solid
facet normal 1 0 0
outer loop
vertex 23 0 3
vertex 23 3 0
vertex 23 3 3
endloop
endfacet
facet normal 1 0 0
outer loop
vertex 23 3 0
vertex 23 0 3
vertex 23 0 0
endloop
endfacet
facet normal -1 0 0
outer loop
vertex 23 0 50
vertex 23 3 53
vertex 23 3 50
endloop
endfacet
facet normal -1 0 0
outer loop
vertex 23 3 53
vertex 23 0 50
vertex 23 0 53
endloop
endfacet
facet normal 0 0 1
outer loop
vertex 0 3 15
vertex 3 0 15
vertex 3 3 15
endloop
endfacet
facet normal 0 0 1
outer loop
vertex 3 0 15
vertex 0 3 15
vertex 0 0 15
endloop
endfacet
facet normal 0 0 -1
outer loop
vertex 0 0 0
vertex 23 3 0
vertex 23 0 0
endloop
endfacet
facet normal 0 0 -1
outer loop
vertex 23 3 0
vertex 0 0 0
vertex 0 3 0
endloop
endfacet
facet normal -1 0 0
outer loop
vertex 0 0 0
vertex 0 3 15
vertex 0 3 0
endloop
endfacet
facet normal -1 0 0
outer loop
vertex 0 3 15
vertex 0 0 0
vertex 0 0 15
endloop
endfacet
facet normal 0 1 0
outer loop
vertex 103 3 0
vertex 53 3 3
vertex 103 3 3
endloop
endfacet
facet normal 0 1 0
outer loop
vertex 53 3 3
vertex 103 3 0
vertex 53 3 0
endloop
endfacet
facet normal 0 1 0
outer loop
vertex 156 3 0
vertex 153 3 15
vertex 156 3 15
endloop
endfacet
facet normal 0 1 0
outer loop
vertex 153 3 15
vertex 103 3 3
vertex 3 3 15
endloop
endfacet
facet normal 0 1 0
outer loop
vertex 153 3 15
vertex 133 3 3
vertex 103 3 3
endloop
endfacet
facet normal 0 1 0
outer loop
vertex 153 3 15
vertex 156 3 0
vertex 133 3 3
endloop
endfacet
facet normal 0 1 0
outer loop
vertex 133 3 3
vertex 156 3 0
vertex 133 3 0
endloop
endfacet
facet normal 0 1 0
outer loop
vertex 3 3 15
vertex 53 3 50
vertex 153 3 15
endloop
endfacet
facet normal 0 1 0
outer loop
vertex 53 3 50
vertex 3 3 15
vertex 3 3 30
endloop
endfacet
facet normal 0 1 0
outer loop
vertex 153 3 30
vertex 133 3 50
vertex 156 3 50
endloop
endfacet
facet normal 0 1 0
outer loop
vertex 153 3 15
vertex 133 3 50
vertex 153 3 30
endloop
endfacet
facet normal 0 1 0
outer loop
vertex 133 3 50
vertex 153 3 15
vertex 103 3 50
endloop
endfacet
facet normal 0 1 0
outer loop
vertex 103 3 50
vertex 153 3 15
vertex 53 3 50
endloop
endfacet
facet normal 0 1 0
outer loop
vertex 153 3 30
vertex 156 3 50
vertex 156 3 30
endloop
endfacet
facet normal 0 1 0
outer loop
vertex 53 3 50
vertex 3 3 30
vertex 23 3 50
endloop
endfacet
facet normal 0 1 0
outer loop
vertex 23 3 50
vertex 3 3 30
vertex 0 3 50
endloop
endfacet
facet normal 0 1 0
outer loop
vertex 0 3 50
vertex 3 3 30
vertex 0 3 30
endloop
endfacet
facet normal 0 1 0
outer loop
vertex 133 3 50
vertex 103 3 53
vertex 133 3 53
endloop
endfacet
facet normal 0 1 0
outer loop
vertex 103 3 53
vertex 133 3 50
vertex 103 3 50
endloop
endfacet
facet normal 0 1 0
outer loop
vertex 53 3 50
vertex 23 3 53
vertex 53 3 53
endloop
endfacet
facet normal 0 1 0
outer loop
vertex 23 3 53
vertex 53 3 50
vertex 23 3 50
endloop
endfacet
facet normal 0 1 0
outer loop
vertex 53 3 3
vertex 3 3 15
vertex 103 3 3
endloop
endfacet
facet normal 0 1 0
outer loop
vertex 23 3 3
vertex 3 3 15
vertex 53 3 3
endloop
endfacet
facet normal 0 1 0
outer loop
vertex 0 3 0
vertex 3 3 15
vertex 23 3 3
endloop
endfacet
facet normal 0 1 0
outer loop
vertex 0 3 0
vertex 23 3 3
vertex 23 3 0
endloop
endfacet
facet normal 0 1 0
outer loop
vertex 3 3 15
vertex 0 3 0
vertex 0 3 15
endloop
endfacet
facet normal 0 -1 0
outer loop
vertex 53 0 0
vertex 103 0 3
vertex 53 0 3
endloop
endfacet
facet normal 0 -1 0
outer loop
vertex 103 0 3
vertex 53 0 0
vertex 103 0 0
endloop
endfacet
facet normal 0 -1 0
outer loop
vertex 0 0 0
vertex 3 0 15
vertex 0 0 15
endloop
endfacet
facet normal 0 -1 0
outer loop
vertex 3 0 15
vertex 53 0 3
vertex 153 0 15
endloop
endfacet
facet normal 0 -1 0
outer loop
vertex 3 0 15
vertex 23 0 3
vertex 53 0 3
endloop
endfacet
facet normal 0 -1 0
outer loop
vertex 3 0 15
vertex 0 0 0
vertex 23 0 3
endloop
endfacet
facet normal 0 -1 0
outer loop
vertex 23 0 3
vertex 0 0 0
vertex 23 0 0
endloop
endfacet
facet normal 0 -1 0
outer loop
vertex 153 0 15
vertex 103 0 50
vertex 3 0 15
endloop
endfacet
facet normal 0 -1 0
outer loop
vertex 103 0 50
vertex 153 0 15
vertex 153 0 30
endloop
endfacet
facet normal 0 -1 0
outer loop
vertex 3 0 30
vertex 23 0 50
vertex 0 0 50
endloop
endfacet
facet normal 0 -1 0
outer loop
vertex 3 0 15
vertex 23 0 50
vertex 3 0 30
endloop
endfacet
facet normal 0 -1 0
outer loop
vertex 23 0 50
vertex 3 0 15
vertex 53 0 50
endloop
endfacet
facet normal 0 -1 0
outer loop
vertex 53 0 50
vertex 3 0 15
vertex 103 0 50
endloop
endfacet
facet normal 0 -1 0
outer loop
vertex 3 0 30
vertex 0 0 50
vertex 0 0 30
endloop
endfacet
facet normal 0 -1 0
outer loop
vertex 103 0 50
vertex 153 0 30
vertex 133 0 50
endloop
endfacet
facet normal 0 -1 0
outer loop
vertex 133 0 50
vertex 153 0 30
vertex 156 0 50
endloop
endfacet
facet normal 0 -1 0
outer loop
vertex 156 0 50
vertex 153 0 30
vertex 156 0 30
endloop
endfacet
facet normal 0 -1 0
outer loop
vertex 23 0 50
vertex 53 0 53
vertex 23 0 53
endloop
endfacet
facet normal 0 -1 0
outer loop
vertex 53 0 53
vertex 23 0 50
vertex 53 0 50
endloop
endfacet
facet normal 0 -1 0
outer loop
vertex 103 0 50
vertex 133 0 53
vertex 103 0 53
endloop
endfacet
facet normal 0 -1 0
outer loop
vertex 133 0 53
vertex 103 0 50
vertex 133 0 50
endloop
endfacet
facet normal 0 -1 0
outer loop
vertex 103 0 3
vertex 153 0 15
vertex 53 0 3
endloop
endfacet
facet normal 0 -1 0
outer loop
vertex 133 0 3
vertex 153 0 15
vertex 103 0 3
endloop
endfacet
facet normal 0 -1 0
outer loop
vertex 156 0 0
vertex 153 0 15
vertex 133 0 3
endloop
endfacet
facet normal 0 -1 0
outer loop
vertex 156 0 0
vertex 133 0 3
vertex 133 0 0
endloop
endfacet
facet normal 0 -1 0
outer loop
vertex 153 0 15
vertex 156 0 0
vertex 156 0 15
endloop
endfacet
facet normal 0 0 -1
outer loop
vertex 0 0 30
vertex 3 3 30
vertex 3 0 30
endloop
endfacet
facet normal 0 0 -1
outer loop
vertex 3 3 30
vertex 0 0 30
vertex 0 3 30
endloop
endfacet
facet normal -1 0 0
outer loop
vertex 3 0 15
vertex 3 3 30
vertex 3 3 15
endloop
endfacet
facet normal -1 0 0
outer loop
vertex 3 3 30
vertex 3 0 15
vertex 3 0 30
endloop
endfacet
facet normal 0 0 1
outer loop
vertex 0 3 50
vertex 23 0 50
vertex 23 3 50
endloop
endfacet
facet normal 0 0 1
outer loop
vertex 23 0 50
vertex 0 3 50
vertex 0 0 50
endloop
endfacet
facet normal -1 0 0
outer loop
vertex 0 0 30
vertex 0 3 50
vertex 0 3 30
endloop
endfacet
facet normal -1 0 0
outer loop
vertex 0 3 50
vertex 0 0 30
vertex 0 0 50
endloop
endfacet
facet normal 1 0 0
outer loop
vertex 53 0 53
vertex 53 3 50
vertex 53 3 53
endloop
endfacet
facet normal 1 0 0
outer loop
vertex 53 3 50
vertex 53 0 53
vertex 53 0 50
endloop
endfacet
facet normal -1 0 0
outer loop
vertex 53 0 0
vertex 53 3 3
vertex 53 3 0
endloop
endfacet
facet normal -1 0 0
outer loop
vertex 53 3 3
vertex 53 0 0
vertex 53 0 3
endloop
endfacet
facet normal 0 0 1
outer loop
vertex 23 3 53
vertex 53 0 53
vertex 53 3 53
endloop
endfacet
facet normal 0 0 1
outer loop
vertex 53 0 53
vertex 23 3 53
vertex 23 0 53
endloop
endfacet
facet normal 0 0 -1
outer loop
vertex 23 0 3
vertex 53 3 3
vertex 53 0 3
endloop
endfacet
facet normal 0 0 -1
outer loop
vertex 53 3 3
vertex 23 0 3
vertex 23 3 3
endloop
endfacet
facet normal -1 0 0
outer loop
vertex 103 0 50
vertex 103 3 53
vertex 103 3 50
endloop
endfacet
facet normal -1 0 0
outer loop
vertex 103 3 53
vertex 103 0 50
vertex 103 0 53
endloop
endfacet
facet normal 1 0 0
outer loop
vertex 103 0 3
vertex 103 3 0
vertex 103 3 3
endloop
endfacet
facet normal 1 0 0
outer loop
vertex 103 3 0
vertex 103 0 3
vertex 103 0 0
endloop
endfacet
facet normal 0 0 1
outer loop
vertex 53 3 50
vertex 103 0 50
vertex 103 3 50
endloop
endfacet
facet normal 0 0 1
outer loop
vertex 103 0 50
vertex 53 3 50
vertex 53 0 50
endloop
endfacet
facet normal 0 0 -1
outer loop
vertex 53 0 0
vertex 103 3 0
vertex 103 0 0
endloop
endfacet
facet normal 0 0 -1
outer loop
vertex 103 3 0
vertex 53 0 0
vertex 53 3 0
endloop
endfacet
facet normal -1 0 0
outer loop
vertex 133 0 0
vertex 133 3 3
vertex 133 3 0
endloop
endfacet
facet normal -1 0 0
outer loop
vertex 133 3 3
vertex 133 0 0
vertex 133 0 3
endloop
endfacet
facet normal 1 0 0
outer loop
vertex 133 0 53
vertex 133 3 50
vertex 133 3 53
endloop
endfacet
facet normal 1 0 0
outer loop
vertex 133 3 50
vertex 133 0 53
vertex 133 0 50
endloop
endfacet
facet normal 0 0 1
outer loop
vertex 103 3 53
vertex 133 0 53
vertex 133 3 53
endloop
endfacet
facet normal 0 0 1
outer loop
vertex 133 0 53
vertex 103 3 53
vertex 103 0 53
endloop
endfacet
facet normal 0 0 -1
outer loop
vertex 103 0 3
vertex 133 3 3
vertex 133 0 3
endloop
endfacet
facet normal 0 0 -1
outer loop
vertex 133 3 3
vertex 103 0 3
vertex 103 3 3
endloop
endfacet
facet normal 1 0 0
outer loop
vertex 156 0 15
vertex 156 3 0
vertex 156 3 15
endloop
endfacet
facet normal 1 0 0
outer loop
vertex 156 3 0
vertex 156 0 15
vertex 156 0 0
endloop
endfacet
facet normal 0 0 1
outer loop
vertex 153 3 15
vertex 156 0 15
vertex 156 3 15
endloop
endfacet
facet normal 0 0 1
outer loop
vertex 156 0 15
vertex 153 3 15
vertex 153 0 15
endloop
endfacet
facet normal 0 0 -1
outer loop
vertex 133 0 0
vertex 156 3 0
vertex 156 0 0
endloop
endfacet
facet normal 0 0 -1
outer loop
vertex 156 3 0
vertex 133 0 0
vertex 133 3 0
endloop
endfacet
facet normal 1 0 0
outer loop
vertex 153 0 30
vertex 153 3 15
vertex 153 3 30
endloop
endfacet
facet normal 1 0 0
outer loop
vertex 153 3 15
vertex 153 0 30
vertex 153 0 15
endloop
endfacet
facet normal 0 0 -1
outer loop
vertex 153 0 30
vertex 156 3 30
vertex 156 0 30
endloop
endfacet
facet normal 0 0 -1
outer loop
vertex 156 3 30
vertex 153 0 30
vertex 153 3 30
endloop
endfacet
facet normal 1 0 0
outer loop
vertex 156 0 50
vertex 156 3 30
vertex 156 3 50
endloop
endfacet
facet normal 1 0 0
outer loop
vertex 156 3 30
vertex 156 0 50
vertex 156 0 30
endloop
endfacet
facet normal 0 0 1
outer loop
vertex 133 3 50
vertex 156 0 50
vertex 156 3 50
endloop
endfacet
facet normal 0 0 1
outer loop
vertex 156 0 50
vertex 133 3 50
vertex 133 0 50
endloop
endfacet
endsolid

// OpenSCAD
module part02 (){
    //links
    color("green") cube([23,3,15]);
    translate([3,0,15])color("green")  cube([20,3,15]);
    translate([0,0,30]) color("green") cube([23,3,20]);
    // high links
    translate([23,0,3]) color("green") cube([30,3,50]);
    // mitte
    translate([53,0,0]) color("green") cube([50,3,50]);
    // high rechts
    translate([103,0,3])color("green")  cube([30,3,50]);
    // rechts
    translate([133,0,0])
    color("green") cube([23,3,15]);
    translate([133,0,15]) color("green") cube([20,3,15]);
    translate([133,0,30]) color("green") cube([23,3,20]);
}
part02();
